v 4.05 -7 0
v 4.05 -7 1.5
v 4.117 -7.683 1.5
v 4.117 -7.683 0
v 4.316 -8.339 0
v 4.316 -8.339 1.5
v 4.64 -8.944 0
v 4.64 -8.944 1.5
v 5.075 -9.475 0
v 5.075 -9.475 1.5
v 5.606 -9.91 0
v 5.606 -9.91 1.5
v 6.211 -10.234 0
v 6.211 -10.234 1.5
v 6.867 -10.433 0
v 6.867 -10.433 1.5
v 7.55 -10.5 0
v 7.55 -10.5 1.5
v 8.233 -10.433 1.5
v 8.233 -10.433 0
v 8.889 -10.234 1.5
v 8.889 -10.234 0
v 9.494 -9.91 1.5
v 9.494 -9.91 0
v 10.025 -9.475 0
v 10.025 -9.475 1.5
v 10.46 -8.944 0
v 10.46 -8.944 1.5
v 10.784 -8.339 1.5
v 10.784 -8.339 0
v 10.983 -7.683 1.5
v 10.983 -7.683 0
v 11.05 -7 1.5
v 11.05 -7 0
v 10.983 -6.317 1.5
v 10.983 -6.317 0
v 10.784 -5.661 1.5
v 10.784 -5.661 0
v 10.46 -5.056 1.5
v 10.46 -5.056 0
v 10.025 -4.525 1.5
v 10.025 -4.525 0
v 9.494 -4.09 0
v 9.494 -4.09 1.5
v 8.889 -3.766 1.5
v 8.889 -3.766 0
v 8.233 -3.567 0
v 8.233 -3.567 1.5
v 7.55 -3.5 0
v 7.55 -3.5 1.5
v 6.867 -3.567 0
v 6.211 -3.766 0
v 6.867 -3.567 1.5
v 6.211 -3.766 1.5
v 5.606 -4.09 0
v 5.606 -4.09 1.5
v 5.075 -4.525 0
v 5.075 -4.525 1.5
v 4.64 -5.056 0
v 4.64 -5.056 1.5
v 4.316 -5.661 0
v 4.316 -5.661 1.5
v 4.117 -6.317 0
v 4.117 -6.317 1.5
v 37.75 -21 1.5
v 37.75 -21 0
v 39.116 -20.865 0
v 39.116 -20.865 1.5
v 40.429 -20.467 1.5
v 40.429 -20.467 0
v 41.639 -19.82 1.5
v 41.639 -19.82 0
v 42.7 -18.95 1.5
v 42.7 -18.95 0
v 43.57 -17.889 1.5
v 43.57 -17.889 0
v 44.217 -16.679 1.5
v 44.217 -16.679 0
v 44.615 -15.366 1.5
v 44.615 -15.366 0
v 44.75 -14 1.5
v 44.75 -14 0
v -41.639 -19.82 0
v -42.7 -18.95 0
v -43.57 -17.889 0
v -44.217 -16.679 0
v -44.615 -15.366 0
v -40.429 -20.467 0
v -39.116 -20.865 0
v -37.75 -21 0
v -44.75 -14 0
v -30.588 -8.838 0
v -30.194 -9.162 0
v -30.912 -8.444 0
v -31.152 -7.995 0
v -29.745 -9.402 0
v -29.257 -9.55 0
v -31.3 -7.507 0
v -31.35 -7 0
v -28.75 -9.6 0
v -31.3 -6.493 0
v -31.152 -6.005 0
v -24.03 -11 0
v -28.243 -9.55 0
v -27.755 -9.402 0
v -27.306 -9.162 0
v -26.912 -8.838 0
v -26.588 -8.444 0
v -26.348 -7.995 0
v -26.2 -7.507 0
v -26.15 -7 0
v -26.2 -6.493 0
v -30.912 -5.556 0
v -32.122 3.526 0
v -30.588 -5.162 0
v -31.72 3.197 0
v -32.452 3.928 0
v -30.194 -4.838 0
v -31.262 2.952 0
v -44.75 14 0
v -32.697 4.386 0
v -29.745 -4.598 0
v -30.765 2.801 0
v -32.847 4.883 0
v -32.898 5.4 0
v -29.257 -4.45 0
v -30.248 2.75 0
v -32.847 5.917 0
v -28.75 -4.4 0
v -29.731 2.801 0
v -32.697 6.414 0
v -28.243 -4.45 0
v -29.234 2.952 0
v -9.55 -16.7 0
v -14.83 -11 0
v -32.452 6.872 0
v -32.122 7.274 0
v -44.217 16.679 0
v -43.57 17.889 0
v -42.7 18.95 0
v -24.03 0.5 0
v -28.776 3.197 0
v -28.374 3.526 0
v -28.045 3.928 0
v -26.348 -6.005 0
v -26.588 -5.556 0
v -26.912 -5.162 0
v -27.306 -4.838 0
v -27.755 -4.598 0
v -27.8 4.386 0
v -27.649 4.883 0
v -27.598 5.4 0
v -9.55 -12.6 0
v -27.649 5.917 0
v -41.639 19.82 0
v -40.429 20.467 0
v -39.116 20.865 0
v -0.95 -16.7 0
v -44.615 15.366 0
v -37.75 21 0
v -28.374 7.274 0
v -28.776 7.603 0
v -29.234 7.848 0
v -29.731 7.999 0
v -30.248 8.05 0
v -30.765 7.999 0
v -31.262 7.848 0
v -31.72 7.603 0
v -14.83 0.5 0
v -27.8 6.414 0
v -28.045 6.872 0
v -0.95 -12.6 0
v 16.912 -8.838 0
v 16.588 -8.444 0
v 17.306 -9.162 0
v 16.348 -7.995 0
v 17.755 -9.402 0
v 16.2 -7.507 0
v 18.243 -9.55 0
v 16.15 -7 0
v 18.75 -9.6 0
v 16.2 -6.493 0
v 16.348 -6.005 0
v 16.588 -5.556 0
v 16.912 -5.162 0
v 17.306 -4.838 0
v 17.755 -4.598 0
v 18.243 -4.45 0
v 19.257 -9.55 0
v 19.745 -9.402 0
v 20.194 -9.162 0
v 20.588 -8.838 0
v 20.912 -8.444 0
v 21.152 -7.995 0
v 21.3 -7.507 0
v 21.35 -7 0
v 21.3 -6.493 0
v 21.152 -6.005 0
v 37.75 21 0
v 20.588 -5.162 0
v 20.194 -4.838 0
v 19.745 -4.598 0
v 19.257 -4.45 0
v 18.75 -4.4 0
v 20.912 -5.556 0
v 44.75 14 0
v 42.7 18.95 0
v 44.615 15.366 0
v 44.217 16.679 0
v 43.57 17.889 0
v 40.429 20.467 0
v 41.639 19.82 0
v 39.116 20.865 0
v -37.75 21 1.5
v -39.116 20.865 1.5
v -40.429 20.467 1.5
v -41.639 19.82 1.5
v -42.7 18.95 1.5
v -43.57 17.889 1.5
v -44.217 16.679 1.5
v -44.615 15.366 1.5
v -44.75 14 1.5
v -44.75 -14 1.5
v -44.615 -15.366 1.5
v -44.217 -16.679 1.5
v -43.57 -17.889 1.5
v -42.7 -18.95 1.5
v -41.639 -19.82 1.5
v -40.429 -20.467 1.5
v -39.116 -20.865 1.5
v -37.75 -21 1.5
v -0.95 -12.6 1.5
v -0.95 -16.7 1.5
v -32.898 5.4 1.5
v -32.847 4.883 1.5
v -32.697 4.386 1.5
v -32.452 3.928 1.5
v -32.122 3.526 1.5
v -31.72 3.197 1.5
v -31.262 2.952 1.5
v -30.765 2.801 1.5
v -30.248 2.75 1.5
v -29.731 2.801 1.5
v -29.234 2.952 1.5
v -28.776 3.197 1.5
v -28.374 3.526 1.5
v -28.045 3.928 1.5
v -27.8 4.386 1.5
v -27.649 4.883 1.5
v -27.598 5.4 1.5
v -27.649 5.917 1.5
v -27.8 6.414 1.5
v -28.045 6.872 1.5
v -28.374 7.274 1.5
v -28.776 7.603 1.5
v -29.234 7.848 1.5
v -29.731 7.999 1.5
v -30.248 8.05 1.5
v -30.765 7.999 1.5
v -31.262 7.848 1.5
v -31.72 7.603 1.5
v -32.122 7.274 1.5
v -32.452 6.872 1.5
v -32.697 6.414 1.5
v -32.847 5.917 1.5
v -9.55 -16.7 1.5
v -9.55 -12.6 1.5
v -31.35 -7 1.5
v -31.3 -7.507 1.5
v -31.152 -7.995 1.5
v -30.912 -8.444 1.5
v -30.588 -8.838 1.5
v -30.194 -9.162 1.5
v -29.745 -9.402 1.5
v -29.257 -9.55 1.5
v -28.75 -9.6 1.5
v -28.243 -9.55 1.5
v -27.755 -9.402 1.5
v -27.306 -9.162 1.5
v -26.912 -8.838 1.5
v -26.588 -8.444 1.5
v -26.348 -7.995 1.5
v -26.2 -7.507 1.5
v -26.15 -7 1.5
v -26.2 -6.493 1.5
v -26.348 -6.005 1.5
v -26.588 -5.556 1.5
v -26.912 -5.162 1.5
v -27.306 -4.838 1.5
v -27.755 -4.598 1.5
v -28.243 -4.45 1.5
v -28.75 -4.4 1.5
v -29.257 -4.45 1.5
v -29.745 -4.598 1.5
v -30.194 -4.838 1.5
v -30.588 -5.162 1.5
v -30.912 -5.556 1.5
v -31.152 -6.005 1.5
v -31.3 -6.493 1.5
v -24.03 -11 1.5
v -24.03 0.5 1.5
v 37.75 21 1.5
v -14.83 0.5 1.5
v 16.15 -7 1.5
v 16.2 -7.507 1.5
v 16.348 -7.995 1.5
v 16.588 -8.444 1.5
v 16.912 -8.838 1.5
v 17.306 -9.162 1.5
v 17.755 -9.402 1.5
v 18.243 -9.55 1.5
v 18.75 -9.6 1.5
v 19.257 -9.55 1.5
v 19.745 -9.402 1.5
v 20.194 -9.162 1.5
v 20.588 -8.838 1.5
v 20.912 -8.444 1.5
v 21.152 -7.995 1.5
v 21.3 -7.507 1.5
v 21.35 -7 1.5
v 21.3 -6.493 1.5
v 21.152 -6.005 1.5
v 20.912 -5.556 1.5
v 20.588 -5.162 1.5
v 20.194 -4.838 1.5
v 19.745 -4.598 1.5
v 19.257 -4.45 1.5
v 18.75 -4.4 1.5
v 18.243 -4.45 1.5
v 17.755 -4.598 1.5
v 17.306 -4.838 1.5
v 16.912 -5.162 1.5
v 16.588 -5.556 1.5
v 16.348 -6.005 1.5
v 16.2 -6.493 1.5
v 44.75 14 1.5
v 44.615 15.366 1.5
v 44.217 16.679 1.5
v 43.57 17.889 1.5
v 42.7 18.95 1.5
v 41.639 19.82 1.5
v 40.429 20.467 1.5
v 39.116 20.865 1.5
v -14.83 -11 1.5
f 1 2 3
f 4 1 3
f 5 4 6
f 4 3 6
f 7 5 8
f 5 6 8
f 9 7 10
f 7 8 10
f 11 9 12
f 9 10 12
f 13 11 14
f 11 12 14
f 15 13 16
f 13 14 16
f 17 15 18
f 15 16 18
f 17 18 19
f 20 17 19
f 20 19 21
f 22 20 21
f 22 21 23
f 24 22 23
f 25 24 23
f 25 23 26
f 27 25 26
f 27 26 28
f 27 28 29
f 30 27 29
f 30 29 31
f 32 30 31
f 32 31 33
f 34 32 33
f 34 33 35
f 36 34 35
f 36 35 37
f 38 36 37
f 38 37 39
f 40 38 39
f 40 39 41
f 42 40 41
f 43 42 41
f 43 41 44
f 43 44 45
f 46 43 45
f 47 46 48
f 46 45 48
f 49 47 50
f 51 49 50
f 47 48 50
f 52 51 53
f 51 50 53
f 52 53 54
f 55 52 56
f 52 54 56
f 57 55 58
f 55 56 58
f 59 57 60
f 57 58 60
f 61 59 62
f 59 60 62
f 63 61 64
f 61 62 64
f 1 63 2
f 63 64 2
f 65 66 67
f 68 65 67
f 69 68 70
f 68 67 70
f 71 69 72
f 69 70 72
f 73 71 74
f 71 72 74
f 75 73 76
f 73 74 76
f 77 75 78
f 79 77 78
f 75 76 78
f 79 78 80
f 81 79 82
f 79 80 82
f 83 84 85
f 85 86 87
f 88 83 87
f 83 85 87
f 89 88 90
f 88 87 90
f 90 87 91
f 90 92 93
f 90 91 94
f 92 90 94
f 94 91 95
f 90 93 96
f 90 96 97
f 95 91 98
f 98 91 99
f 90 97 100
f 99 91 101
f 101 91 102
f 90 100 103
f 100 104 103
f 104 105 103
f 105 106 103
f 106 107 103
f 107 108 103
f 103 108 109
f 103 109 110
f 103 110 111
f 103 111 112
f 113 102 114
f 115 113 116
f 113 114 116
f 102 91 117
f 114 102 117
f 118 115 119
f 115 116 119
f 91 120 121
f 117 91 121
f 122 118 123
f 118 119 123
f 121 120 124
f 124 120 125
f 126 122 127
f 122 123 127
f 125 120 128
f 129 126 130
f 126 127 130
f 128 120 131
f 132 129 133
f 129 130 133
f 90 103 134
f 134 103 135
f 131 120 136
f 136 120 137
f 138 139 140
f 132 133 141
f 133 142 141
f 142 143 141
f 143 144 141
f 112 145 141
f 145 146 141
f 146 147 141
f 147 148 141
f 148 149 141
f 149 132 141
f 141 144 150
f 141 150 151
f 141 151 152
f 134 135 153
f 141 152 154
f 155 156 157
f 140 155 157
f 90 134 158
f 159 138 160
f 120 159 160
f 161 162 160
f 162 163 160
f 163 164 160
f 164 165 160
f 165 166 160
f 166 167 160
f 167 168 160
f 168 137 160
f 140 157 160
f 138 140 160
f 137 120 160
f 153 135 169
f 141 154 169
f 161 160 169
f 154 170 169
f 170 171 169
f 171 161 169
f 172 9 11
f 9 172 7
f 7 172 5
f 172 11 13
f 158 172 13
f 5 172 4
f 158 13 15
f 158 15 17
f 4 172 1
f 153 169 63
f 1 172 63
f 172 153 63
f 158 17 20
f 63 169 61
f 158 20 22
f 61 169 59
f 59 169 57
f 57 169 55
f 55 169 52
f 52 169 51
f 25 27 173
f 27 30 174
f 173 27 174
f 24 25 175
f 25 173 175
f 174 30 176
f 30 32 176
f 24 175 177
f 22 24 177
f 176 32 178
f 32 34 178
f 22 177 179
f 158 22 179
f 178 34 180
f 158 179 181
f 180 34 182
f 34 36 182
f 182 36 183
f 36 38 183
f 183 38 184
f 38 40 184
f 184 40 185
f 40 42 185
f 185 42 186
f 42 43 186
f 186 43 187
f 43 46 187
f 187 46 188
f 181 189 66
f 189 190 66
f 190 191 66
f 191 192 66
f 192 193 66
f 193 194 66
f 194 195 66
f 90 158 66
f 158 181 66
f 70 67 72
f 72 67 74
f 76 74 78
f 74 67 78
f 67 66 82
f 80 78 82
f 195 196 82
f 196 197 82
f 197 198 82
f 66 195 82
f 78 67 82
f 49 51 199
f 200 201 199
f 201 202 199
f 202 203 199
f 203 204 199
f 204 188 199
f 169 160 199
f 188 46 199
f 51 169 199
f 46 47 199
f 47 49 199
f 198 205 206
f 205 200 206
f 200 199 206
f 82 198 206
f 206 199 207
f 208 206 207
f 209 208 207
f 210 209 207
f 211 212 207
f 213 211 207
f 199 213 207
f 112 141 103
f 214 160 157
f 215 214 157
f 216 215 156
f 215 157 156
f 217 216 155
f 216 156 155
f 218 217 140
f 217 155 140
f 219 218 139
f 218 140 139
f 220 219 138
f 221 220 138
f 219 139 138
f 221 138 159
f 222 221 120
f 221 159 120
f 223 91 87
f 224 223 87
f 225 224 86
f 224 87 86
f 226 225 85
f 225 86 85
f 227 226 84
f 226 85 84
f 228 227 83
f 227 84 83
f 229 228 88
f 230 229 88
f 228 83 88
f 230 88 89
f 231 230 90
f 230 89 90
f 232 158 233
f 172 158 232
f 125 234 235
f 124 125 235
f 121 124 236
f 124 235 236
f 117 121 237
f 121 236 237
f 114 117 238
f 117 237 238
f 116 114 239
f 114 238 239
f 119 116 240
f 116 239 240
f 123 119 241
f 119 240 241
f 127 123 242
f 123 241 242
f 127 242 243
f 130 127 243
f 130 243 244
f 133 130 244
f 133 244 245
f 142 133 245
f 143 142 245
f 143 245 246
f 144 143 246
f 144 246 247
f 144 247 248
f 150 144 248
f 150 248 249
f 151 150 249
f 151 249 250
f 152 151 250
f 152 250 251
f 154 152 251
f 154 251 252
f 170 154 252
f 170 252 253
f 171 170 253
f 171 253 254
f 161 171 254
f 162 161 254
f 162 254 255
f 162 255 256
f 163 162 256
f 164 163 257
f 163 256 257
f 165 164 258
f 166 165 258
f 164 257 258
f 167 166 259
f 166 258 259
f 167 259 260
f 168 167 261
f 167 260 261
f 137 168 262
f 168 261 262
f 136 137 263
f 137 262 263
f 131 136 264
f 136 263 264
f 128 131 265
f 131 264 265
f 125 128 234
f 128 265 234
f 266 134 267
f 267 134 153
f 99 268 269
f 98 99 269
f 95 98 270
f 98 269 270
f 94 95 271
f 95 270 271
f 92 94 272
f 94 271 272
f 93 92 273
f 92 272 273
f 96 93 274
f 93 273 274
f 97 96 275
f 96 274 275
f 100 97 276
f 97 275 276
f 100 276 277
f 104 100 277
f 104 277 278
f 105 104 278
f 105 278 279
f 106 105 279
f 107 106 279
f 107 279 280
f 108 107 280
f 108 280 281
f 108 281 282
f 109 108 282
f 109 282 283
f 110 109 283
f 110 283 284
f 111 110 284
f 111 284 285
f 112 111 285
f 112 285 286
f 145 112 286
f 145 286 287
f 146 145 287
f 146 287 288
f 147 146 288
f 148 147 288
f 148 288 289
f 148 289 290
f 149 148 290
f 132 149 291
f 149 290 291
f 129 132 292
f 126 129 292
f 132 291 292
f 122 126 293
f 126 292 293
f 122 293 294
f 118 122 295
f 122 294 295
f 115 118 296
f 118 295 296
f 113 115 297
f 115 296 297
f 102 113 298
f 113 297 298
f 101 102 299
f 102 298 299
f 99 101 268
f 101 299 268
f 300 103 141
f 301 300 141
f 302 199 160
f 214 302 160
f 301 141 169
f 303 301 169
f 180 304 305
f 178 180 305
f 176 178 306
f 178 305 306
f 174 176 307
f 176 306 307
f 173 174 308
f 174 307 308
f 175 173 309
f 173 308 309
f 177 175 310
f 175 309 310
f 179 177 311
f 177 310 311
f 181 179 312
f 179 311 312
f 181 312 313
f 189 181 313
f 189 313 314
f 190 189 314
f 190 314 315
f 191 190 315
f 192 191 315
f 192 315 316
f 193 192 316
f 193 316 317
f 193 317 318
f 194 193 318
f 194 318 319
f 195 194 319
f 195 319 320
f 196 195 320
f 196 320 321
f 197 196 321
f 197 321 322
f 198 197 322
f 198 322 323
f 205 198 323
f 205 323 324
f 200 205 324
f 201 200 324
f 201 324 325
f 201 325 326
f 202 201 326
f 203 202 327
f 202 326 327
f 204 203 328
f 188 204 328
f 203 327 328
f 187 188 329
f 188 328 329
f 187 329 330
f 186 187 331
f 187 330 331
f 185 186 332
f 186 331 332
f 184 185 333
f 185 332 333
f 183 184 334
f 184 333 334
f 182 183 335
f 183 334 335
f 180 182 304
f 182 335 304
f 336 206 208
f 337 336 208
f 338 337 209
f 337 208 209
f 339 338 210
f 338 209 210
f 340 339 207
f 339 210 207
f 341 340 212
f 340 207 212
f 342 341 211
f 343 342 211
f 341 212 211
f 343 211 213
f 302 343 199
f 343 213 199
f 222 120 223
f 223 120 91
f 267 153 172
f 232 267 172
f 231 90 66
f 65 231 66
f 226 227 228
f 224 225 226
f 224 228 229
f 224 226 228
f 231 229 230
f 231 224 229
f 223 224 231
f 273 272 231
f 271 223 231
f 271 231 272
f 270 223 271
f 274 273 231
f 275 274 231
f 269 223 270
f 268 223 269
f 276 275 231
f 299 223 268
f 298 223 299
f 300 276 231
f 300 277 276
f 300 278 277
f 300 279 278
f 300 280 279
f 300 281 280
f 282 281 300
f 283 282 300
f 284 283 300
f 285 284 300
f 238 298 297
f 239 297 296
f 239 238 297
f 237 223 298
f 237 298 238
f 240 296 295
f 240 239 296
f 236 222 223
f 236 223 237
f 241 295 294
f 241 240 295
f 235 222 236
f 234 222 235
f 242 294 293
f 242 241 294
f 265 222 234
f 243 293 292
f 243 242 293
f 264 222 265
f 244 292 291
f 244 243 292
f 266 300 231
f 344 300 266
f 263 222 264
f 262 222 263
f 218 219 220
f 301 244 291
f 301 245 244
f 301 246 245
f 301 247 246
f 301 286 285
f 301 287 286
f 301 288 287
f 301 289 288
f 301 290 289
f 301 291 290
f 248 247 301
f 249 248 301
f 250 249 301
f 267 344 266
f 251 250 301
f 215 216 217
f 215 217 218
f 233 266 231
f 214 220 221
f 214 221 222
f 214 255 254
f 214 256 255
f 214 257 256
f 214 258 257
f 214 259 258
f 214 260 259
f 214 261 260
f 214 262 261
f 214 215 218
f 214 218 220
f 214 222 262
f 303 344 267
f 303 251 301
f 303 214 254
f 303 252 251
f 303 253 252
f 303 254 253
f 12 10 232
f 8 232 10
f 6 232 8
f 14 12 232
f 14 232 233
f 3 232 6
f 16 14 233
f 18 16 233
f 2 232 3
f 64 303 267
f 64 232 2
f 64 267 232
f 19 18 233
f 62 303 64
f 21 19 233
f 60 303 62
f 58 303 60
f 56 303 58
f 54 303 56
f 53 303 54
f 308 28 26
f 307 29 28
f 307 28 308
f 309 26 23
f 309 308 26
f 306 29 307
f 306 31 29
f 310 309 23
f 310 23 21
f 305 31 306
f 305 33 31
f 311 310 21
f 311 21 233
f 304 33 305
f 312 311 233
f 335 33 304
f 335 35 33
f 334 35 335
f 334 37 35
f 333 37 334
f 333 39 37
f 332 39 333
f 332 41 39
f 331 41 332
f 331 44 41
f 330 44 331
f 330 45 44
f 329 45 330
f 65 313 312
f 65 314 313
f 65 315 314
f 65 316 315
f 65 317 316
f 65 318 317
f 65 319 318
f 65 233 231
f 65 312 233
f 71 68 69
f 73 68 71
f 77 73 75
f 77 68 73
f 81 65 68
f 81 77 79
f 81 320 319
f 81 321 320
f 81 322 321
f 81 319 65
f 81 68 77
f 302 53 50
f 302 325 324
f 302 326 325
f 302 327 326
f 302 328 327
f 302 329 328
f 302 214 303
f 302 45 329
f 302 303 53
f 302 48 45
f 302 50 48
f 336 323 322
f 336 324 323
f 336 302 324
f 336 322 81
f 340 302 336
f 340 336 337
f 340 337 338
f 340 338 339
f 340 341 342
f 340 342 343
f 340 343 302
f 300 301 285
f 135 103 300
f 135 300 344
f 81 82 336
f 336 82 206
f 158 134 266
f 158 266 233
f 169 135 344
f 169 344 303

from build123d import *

# Parameters (mm, degrees)
F0_W     = 8.6
F0_H     = 4.1
F0_W_2   = 9.2
F0_H_2   = 11.5
F1_DEPTH = 1.5
F2_D     = 5.2
F2_DEPTH = 2
F2_TIP   = 1.5622376095
F3_D     = 7
F3_DEPTH = 2
F3_TIP   = 2.1030121666
F4_D     = 5.3
F4_DEPTH = 2
F4_TIP   = 1.5922806404


# Not quite as in the source:
# - a feature names something its author has since deleted; it is built from what else it names


with BuildPart() as f1:
    # F0 (on Top) → F1 (new body)
    with BuildSketch(Plane.XY):
        with BuildLine():
            Line((-37.75, -21), (37.75, -21))
            ThreePointArc((37.75, -21), (42.6997474683, -18.9497474683), (44.75, -14))
            Line((44.75, -14), (44.75, 14))
            ThreePointArc((44.75, 14), (42.6997474683, 18.9497474683), (37.75, 21))
            Line((37.75, 21), (-37.75, 21))
            ThreePointArc((-37.75, 21), (-42.6997474683, 18.9497474683), (-44.75, 14))
            Line((-44.75, 14), (-44.75, -14))
            ThreePointArc((-44.75, -14), (-42.6997474683, -18.9497474683), (-37.75, -21))
        make_face()
        with Locations((-5.25, -14.65)):
            Rectangle(F0_W, F0_H, mode=Mode.SUBTRACT)
        with Locations((-19.43, -5.25)):
            Rectangle(F0_W_2, F0_H_2, mode=Mode.SUBTRACT)
    extrude(amount=F1_DEPTH)

    # F2
    with Locations(Plane(origin=(0, 0, 0), x_dir=(1, 0, 0), z_dir=(0, 0, -1))):
        with Locations((18.75, 7), (-28.75, 7)):
            Hole(F2_D / 2, depth=F2_DEPTH)
            with Locations((0, 0, -(F2_DEPTH + F2_TIP / 2))):  # 118° drill point
                Cone(0, F2_D / 2, F2_TIP, mode=Mode.SUBTRACT)

    # F3
    with Locations(Plane(origin=(0, 0, 0), x_dir=(1, 0, 0), z_dir=(0, 0, -1))):
        with Locations((7.55, 7)):
            Hole(F3_D / 2, depth=F3_DEPTH)
            with Locations((0, 0, -(F3_DEPTH + F3_TIP / 2))):  # 118° drill point
                Cone(0, F3_D / 2, F3_TIP, mode=Mode.SUBTRACT)

    # F4
    with Locations(Plane(origin=(0, 0, 0), x_dir=(1, 0, 0), z_dir=(0, 0, -1))):
        with Locations((-30.2482247353, -5.4)):
            Hole(F4_D / 2, depth=F4_DEPTH)
            with Locations((0, 0, -(F4_DEPTH + F4_TIP / 2))):  # 118° drill point
                Cone(0, F4_D / 2, F4_TIP, mode=Mode.SUBTRACT)


solid = f1.part
